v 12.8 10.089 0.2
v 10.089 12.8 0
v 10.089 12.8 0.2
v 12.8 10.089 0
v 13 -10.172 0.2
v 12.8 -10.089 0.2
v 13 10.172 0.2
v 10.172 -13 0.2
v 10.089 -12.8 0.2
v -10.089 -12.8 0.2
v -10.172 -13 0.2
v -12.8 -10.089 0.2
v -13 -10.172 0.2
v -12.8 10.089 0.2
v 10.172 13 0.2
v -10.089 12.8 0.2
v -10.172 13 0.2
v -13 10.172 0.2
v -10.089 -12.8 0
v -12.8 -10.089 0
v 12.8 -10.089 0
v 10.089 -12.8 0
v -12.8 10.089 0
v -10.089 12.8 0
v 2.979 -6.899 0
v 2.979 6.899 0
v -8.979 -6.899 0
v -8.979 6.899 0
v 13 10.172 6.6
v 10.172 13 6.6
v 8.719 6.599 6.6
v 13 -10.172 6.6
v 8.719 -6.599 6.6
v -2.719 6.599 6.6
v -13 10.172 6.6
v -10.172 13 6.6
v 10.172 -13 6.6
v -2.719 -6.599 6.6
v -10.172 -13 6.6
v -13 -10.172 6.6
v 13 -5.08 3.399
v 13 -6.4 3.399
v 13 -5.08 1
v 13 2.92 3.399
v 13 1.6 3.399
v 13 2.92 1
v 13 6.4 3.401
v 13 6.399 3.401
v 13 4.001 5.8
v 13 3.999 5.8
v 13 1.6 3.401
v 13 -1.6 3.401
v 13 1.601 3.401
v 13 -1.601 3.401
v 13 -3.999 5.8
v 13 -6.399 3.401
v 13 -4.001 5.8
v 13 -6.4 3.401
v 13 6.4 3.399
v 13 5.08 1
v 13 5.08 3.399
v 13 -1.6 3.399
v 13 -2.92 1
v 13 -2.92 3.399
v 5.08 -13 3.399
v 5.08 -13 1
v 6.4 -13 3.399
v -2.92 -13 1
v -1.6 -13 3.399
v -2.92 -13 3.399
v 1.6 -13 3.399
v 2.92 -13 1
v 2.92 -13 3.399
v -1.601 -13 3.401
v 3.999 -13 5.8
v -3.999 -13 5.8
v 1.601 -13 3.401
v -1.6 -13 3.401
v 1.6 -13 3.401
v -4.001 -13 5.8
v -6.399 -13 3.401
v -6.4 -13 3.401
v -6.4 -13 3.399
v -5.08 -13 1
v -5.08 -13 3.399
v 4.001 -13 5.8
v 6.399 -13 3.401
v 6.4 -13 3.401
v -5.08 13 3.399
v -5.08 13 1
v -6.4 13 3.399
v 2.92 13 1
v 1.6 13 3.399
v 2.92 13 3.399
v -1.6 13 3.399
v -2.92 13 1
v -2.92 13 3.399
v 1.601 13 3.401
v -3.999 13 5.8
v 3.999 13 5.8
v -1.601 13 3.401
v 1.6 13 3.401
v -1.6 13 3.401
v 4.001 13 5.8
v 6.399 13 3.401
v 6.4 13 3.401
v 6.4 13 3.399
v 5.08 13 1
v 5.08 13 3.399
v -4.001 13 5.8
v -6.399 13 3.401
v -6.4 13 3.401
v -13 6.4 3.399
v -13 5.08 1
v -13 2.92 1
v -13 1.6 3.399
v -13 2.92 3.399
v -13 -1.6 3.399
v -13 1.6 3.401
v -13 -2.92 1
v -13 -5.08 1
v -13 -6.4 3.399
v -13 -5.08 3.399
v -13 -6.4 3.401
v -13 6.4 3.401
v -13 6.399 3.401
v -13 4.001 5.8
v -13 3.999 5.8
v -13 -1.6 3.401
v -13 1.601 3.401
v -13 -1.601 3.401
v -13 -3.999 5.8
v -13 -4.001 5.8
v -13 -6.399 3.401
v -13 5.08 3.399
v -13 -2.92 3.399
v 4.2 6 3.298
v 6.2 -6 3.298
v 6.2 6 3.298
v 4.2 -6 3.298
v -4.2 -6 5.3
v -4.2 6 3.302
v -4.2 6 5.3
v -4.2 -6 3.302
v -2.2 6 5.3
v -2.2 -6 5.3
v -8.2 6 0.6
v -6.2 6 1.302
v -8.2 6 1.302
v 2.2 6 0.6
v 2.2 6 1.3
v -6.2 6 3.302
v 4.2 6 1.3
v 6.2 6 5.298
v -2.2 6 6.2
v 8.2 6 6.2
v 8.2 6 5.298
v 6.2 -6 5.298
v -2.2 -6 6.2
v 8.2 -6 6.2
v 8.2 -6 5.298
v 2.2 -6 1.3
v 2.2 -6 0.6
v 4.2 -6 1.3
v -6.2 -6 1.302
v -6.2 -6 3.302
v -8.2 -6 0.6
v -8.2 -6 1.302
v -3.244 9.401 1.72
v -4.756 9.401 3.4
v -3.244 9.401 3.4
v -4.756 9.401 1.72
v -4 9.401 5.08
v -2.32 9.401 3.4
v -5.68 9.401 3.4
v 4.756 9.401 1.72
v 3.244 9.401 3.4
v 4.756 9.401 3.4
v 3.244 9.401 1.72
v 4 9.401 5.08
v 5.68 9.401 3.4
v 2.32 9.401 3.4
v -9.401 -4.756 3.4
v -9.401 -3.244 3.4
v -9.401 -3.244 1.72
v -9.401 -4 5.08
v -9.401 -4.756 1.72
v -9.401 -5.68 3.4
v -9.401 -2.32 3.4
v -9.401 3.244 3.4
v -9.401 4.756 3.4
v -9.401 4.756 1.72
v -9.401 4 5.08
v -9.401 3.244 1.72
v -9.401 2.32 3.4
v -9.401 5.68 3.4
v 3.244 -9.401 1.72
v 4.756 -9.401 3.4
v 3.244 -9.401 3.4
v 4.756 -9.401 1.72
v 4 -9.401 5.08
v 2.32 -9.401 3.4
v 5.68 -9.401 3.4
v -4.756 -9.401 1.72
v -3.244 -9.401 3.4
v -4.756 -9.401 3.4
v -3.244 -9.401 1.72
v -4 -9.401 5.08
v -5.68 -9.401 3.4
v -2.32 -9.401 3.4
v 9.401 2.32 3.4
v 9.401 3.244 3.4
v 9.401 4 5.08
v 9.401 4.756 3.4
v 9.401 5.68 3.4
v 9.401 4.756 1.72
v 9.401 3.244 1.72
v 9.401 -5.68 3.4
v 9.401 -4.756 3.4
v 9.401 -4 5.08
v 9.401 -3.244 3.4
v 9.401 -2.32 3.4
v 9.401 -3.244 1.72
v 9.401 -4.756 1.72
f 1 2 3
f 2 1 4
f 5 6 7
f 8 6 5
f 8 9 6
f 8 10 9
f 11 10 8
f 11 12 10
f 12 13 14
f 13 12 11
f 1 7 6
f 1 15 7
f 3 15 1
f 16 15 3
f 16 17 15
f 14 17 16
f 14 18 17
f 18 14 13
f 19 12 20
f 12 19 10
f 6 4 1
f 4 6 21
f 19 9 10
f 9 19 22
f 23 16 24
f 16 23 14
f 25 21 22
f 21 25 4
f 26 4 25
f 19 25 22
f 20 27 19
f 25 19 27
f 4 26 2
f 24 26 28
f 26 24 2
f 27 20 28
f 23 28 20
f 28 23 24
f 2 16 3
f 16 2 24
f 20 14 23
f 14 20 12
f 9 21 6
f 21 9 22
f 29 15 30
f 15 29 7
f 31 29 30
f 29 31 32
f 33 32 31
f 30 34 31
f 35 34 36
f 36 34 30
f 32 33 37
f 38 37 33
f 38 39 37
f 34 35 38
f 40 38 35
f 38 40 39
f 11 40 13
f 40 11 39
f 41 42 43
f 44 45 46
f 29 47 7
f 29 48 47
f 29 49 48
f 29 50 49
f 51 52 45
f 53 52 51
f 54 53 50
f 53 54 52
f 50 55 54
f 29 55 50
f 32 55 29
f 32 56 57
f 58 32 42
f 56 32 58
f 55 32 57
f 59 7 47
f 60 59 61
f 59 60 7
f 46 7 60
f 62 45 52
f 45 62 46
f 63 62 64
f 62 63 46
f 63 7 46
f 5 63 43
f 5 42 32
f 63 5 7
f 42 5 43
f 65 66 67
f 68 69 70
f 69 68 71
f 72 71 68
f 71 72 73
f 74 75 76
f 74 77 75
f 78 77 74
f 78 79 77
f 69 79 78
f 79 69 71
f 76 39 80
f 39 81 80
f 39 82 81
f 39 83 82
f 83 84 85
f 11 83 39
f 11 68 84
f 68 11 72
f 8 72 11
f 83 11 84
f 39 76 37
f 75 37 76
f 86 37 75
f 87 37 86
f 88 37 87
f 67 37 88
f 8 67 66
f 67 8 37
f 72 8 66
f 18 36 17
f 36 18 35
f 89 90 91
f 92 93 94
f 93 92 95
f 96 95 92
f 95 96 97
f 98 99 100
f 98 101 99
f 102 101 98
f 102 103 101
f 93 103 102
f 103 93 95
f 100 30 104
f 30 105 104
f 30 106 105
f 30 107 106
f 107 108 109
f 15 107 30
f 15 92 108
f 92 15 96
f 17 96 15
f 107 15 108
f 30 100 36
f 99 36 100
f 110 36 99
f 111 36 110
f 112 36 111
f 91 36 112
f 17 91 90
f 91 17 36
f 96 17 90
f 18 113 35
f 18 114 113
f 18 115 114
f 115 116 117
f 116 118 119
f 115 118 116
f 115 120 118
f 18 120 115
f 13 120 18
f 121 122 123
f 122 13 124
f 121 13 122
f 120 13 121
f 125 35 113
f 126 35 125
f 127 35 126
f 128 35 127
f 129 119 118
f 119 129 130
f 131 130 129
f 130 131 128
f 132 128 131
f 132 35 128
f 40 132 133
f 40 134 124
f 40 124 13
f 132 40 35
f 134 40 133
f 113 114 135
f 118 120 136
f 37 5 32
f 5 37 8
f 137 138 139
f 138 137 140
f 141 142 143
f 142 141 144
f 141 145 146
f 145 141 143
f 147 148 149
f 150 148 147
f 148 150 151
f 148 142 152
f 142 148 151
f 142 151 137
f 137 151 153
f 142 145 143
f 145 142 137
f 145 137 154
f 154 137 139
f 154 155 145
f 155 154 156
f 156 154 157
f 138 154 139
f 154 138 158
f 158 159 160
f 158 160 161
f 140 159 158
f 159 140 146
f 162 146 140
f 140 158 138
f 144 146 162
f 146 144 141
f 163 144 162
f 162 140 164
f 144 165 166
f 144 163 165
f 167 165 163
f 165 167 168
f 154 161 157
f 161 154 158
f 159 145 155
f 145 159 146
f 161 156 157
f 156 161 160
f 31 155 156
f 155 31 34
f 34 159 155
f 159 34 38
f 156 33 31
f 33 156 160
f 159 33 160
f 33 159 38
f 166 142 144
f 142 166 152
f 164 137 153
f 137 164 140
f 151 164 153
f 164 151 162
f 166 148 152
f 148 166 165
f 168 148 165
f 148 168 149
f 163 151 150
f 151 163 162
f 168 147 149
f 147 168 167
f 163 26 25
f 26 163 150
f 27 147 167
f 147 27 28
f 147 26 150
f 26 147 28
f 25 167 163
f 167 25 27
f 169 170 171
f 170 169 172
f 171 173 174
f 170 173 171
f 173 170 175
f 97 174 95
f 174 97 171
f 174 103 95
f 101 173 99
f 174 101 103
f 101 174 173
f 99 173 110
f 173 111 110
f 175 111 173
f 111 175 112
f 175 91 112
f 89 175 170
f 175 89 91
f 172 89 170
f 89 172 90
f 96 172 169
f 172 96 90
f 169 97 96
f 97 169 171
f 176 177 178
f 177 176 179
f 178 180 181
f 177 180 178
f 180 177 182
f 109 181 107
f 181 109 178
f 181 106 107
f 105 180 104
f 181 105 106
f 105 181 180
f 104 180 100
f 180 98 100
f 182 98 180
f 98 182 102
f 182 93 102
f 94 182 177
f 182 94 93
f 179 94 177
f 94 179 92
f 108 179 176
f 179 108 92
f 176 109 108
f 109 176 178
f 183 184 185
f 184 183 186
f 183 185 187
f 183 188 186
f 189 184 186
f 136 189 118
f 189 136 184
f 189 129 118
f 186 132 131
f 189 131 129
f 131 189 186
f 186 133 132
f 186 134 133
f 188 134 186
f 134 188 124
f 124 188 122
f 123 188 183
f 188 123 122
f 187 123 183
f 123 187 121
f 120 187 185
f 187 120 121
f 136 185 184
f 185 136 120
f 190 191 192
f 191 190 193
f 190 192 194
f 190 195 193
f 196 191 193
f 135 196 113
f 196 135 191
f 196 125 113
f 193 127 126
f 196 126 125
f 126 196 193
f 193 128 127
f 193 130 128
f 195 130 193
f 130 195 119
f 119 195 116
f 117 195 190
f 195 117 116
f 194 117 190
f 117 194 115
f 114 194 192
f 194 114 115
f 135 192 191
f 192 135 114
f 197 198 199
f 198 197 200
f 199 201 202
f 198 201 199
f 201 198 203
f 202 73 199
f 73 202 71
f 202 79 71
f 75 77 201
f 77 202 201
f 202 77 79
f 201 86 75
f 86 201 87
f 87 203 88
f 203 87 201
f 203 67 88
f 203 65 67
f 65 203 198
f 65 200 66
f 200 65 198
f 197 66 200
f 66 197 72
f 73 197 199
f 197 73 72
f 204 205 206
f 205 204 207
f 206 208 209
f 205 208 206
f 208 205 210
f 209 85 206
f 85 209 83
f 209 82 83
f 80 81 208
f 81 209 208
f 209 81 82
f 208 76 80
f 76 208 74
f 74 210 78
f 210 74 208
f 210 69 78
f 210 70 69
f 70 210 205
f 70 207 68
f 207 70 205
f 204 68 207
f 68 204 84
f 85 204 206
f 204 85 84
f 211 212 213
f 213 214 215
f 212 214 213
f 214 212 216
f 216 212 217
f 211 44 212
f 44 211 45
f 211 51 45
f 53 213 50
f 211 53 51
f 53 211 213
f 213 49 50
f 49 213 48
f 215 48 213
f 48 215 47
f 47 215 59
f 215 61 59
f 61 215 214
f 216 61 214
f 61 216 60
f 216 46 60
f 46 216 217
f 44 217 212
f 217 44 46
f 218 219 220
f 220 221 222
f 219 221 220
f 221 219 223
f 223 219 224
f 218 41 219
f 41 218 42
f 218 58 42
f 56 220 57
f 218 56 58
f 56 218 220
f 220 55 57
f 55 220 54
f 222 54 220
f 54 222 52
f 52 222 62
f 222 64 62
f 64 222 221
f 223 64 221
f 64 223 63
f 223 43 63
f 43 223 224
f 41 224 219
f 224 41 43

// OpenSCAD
eps = 0.001;
layer = 0.2;

width = 26; 
height = 6.6;

module exterior_2d() {
  difference() {
    square([width, width], center=true);
    
    // Chamfer corners.
    for (a = [-1, 1], b = [-1, 1])
      scale([a, b])
        translate([width/2, width/2])
          rotate([0, 0, 45])
            square(4, center=true);
  }
}

module exterior() {
  linear_extrude(layer)
    offset(-0.2)
      exterior_2d();
  translate([0, 0, layer])
    linear_extrude(height - layer)
      exterior_2d();
}

module ladder() {
  stair_width = 12;
  
  difference() {
    exterior();
    
    translate([0, 0, height/2]) {
      for (a = [0, 180]) {
        rotate([0, a, 0]) {
          for (s = [0, 1])
            translate([1 + 2*s, 0, 2*s - 2*eps])
              linear_extrude(2 + 2*eps)
                square([width * 0.4, stair_width], center=true);
          
          translate([3, 0, a == 0 ? 2.9 : 2.7])
            linear_extrude(2 + 2*eps, scale=1.5)
              square([width * 0.4, stair_width], center=true);
        }
      }
    }
    
    for (a = [0:3])
      rotate([0, 0, a*90])
        for (x = 4 * [-1, 1])
          translate([x, width/2 + eps, 3.4])
            rotate([90, 0, 0])
              linear_extrude(3.6, scale=0.7)
                arrow_2d();
  }
}

module arrow_2d() {
  scale([1.2, 1.2]) {
    hull() {
      translate([0, 2])
        square(eps, center=true);
      square([4, eps], center=true);
    }
    translate([-0.9, -2])
      square([1.8, 2]);
  }
}

ladder();
